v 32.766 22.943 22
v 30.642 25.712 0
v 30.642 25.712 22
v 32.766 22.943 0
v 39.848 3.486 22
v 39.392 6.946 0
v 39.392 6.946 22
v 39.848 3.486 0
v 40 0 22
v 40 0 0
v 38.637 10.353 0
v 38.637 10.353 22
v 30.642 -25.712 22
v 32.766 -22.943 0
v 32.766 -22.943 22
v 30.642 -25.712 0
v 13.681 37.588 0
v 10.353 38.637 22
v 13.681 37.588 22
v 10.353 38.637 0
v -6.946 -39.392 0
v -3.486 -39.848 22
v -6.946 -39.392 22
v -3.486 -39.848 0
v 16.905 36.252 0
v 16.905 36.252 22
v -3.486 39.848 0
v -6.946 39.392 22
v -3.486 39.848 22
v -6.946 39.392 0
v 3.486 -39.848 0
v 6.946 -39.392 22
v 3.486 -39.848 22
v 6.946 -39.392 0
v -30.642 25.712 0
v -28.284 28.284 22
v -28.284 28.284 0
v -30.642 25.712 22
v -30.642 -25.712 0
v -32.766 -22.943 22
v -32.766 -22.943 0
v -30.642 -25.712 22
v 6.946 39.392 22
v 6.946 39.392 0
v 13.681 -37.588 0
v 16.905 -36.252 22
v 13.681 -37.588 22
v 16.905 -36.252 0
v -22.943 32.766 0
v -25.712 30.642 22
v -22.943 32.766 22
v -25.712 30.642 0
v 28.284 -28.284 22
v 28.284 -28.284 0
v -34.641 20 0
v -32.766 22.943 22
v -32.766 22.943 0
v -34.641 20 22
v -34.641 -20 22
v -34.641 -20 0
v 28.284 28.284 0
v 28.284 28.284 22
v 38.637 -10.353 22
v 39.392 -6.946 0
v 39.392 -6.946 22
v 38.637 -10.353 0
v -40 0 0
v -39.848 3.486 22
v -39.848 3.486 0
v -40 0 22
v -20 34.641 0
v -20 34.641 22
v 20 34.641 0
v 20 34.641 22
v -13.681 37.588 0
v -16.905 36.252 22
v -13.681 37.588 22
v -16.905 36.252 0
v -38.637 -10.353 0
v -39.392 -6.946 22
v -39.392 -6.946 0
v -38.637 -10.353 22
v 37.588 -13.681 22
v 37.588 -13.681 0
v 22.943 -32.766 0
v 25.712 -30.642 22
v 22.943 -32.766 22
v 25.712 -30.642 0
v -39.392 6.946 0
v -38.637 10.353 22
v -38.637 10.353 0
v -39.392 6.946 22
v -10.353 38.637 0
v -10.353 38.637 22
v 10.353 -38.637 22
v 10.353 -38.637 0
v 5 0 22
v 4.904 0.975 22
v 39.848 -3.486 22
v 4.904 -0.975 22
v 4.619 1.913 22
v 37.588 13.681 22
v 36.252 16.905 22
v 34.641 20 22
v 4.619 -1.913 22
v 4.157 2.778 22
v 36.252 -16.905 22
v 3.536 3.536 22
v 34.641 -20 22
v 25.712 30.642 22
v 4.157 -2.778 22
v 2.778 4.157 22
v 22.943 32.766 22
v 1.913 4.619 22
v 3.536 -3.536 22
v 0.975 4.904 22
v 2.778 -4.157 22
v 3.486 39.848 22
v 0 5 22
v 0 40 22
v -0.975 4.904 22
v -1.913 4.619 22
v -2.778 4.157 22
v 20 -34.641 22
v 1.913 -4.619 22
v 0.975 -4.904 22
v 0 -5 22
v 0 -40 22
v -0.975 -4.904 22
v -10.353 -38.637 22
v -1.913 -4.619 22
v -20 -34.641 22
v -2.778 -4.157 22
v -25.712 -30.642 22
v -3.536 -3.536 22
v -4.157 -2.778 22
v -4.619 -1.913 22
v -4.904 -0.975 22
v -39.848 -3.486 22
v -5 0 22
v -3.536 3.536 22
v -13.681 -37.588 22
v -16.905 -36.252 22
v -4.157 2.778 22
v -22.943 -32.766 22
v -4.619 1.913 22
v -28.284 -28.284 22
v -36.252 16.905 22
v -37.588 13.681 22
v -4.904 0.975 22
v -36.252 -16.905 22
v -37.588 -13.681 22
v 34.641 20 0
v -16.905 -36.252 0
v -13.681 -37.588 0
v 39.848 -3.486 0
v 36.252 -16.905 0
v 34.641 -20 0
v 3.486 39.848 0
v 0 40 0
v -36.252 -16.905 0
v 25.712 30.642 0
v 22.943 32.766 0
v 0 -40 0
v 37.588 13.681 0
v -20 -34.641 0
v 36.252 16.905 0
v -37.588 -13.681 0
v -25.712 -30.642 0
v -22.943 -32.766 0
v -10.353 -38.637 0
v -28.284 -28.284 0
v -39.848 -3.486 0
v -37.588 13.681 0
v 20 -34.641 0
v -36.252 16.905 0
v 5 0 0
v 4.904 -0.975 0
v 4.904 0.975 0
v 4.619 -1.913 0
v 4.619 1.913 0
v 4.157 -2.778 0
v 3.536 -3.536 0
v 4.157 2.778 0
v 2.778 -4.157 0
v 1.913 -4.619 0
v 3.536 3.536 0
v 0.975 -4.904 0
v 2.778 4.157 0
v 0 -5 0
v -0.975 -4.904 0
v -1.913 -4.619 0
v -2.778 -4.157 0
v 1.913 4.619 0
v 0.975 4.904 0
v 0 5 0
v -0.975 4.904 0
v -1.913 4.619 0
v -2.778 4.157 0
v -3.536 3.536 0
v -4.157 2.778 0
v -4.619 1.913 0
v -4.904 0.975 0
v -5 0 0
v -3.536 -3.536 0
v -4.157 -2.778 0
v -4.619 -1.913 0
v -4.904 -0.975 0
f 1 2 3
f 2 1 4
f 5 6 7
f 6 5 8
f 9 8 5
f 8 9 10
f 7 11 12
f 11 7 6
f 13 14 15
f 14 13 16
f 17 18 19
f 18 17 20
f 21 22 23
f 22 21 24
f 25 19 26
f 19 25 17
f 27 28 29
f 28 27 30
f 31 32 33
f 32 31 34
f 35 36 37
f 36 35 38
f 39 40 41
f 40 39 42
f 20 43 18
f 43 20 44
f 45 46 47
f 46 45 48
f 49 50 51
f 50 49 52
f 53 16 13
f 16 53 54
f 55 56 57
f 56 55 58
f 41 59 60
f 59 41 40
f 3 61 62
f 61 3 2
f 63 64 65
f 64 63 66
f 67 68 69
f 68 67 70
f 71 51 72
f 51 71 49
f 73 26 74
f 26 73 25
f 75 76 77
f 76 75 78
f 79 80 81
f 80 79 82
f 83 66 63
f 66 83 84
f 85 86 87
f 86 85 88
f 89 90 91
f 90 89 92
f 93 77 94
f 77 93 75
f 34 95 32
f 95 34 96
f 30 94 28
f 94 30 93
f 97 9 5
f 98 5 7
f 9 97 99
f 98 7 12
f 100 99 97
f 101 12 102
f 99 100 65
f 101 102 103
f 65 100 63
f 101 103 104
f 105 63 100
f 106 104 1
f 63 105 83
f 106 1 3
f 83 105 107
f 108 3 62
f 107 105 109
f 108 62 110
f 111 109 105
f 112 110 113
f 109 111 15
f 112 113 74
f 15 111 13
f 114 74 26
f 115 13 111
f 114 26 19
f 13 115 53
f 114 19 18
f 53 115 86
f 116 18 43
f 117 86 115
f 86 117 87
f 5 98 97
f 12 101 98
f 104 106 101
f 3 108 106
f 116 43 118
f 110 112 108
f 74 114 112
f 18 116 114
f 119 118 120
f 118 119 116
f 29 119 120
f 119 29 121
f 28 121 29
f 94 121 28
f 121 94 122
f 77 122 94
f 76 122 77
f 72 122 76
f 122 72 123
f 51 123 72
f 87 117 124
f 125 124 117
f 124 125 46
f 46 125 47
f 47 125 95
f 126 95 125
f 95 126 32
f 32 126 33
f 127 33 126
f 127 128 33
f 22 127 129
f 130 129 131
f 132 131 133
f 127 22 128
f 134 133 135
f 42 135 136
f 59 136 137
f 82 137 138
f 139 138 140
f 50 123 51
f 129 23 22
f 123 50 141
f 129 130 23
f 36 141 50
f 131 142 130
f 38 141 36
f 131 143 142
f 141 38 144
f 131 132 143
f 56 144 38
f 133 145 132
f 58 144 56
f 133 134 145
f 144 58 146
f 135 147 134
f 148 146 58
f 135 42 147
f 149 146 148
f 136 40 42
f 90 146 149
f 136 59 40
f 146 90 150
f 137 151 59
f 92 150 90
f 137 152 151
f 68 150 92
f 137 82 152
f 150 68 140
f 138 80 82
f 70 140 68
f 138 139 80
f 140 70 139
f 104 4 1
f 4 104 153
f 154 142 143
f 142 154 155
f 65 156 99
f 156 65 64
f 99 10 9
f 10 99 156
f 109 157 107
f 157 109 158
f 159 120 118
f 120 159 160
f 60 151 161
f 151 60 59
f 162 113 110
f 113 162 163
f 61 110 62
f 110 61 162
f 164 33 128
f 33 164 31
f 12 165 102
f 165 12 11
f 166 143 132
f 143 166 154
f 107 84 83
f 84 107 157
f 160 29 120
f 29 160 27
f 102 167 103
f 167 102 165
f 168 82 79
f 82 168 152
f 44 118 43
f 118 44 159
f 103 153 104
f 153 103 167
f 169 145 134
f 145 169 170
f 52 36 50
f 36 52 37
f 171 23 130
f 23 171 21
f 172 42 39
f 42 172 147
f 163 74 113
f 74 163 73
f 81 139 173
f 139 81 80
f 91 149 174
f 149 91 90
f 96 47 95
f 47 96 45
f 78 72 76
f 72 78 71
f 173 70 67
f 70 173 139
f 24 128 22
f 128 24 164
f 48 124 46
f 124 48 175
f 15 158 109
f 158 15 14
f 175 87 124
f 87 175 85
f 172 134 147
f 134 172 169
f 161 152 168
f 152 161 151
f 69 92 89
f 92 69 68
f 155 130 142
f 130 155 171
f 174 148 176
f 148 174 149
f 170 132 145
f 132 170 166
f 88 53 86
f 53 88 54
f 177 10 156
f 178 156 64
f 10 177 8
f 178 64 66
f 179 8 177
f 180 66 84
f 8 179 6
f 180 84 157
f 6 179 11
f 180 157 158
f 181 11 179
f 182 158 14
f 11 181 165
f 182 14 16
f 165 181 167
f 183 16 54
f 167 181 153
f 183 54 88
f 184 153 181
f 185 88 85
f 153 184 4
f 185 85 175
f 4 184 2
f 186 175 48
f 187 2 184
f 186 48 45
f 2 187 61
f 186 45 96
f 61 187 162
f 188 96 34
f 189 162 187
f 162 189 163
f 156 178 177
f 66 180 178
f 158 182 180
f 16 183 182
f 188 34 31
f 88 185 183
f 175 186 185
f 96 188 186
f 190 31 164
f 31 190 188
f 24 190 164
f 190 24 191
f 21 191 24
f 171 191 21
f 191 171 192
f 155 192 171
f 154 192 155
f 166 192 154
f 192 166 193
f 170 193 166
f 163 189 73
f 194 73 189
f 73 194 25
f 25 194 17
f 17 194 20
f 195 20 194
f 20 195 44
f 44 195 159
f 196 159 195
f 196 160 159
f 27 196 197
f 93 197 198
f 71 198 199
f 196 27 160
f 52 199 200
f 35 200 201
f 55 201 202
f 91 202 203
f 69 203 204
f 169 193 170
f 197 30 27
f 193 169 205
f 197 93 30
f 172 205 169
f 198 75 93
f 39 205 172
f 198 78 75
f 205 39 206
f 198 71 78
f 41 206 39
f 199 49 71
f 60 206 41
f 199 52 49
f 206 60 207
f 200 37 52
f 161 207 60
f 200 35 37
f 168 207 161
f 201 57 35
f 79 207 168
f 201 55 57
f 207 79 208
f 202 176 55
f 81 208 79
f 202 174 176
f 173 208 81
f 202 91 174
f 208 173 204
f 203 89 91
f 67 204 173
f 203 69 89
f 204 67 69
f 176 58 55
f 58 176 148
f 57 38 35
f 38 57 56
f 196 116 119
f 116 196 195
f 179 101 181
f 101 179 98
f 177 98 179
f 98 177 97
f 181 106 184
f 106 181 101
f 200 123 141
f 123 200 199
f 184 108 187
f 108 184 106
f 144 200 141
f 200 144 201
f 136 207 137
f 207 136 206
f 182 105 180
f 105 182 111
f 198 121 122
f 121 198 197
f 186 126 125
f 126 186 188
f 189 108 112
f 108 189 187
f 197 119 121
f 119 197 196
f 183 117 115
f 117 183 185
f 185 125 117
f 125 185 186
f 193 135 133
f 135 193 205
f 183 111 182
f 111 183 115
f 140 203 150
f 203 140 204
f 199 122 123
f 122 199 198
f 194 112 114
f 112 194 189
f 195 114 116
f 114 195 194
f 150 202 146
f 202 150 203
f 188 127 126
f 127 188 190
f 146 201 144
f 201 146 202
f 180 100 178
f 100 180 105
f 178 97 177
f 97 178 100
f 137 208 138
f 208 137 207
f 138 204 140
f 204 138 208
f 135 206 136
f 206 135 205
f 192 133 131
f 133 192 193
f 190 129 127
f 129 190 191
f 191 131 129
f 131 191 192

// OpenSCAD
module wheel_80(d=80,w=22,hub=5){
  difference(){
    cylinder(h=w,r=d/2,$fn=72);
    translate([0,0,-0.1]) cylinder(h=w+0.2,r=hub,$fn=32);
  }
}
wheel_80();
